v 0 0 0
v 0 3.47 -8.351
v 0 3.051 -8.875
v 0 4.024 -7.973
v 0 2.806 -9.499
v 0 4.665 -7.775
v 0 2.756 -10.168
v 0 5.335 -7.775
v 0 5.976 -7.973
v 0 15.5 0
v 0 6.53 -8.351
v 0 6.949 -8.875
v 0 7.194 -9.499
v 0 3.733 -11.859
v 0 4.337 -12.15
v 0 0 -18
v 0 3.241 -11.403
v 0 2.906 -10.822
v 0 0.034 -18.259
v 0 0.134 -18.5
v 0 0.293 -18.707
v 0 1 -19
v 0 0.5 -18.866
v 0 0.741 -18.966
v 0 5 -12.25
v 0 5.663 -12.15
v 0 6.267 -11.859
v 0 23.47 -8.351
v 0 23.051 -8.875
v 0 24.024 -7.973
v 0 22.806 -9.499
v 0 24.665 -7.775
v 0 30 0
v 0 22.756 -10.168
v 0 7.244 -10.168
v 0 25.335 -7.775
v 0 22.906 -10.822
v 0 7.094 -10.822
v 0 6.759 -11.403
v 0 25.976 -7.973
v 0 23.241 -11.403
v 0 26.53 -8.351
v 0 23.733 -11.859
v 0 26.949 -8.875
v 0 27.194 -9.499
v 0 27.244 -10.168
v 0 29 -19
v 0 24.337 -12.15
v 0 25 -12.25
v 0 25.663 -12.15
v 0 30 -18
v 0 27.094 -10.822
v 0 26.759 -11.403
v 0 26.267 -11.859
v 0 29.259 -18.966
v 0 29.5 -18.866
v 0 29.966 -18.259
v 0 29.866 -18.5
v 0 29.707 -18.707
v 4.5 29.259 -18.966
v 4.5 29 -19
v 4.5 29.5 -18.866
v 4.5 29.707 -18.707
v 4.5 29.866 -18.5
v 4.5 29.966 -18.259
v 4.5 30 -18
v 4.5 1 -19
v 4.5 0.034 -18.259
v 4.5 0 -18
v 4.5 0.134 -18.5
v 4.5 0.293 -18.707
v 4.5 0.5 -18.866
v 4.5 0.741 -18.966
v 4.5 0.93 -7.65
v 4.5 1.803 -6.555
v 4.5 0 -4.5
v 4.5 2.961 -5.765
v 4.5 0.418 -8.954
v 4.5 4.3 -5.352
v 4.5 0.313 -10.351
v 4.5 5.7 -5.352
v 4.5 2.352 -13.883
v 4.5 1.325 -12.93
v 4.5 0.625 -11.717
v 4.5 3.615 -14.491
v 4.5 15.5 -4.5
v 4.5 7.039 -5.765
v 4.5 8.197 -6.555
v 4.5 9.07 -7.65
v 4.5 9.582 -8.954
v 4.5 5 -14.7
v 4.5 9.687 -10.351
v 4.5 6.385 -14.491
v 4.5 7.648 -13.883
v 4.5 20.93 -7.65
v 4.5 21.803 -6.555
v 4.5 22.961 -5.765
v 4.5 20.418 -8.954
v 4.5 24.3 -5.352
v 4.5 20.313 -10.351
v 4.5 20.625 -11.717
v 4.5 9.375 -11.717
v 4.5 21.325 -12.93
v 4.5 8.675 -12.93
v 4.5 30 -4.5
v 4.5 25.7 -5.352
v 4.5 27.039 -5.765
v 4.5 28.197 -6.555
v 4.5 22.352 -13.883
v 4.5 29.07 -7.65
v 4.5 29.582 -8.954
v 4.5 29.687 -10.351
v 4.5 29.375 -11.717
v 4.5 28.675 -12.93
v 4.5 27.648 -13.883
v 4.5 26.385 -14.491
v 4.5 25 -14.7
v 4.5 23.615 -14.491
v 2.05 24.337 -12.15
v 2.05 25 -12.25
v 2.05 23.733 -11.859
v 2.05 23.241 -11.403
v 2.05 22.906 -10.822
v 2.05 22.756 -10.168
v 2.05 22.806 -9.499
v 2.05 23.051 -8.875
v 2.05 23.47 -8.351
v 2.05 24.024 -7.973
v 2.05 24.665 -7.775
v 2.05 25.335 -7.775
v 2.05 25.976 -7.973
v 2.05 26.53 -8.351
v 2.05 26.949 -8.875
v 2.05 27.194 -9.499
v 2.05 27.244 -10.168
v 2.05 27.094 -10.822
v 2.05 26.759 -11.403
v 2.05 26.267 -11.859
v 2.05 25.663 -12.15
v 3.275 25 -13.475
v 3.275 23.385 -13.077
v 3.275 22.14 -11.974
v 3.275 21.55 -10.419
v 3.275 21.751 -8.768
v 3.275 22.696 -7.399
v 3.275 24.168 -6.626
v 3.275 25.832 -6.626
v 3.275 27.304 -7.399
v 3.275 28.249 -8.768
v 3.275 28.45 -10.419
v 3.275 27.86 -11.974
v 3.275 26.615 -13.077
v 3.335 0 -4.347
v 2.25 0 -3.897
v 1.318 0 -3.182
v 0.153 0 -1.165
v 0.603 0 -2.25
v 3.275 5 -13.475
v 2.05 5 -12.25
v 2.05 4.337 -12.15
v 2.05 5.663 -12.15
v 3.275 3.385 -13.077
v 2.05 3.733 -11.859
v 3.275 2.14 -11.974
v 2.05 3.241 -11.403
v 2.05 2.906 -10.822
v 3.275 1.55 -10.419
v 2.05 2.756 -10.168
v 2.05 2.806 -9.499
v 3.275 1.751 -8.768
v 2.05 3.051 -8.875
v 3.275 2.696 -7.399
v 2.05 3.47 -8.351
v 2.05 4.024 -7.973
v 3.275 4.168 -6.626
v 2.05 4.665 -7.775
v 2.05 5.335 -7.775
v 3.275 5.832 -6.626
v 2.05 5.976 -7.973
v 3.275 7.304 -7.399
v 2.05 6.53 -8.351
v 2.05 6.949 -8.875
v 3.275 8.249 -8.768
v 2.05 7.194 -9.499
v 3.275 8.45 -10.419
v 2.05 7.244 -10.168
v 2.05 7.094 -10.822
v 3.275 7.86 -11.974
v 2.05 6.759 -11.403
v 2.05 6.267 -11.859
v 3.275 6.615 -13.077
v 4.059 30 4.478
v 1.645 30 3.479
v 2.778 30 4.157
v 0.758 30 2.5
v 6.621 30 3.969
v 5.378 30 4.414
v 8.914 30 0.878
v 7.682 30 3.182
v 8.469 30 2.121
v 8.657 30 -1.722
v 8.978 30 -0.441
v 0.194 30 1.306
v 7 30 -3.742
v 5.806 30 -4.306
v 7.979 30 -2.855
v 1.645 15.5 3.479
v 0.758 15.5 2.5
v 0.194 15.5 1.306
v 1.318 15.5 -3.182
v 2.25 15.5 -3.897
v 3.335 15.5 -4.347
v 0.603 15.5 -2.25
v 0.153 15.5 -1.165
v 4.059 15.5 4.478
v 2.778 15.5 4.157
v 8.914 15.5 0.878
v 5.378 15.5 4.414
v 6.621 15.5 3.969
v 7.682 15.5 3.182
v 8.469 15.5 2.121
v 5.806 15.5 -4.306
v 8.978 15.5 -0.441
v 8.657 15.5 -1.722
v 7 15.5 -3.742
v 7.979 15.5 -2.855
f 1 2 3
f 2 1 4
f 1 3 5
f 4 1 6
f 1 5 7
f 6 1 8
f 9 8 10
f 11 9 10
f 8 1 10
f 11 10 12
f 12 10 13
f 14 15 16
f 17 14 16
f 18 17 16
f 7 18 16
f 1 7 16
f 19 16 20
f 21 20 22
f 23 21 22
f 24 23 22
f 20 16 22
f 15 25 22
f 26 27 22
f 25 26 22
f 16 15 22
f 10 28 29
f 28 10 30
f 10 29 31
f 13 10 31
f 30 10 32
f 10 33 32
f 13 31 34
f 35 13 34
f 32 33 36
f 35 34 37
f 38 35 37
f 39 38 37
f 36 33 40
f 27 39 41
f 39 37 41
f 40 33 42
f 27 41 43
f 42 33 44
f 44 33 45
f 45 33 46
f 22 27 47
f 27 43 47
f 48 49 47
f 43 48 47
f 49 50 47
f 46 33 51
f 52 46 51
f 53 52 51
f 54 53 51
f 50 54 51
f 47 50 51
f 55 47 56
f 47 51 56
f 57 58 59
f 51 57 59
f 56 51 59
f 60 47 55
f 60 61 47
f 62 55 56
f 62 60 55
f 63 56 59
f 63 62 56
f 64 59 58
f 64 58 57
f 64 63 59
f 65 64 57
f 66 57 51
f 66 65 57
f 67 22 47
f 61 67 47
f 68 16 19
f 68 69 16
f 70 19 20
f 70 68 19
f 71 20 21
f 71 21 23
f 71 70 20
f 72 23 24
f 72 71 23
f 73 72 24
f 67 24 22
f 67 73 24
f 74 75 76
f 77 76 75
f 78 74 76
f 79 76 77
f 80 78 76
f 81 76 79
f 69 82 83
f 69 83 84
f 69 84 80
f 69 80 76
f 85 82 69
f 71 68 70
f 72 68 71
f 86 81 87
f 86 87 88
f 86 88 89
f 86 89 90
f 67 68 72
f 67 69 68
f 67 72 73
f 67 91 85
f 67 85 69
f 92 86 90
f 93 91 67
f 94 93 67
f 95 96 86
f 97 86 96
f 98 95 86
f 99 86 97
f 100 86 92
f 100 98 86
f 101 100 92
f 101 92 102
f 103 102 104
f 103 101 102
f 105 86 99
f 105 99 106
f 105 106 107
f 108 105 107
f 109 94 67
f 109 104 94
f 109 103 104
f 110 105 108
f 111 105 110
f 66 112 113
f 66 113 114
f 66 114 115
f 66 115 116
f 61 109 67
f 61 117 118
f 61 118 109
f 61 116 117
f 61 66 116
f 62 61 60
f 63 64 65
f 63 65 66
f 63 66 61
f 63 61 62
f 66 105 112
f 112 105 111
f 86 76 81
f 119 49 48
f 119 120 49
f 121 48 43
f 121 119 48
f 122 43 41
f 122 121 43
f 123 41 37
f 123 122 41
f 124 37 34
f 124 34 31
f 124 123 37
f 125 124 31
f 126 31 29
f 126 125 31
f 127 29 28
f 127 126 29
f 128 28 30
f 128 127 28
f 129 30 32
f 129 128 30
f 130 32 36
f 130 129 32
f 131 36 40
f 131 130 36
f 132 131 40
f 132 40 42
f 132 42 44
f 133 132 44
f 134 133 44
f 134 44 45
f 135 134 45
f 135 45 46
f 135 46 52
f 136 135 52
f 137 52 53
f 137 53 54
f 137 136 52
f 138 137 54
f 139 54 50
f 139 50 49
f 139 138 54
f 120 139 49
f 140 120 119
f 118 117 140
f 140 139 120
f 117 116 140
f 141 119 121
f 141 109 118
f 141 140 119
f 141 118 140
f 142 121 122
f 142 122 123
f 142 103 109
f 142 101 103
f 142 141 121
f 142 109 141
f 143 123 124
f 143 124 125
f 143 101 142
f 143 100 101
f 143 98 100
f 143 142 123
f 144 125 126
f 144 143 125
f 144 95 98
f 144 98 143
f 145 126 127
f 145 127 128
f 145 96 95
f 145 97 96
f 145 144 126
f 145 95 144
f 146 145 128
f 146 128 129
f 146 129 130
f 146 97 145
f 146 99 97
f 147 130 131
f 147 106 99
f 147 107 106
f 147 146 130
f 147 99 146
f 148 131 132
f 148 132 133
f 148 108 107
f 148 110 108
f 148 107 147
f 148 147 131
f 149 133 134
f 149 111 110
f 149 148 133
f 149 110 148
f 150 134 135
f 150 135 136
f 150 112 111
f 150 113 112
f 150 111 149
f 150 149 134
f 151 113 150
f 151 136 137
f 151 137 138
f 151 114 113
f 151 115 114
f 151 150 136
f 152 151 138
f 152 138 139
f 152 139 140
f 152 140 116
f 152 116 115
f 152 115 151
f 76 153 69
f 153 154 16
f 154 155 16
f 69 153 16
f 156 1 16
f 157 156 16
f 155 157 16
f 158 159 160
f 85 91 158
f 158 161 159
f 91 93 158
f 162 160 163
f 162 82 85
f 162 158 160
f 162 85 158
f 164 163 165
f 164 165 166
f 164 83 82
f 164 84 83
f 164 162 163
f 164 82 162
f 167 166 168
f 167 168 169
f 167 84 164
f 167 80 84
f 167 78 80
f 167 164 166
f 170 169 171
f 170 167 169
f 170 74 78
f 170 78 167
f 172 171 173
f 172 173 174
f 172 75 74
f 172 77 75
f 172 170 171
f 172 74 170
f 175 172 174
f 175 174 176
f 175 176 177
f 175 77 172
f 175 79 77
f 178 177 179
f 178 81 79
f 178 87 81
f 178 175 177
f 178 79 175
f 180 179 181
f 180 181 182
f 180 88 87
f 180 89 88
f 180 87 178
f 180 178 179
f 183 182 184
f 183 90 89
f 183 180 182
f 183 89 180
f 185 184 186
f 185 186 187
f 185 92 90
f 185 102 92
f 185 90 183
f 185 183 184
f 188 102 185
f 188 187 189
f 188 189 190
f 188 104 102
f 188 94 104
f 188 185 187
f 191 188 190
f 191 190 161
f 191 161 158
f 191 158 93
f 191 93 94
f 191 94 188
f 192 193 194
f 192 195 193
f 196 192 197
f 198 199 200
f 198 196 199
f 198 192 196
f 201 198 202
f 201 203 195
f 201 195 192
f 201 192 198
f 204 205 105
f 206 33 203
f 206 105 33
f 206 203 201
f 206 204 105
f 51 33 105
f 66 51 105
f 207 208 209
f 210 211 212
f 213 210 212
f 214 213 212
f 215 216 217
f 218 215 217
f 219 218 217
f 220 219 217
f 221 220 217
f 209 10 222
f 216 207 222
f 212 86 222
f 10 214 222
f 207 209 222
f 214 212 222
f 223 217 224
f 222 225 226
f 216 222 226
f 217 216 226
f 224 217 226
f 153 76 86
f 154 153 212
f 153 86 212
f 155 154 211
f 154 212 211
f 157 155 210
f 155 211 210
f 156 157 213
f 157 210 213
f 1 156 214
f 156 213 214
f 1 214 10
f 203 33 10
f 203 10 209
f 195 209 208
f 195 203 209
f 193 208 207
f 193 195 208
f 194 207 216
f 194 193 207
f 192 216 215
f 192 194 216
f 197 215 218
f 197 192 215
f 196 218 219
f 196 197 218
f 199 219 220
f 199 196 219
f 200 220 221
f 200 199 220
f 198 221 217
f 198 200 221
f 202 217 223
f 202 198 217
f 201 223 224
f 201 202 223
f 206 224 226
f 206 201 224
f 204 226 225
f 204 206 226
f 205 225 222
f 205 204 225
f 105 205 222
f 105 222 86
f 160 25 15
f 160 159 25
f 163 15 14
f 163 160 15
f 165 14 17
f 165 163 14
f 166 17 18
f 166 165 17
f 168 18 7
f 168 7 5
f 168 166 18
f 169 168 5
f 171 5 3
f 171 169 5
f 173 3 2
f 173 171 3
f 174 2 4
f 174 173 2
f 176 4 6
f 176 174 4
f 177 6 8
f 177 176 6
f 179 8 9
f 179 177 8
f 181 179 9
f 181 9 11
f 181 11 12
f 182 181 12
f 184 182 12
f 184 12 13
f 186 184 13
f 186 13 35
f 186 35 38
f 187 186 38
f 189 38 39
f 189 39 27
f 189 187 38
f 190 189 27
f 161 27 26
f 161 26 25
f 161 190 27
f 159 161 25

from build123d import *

# Parameters (mm, degrees)
SKETCH1_W                                    = 19
SKETCH1_H                                    = 30
PLATE_DEPTH                                  = 4.5
SKETCH2_R                                    = 4.5
CYLINDER_DEPTH                               = 14.5
CLEARANCE_START                              = -14.5
SKETCH2_2_R                                  = 4.5
CLEARANCE_DEPTH                              = 15.5
FILLET1_R                                    = 1
CSK_FOR_M4_COUNTERSUNK_FLAT_HEAD_SCR_2_COUNT = 2
CSK_FOR_M4_COUNTERSUNK_FLAT_HEAD_SCR_2_PITCH = 20


with BuildPart() as part:
    # Sketch1 → Plate (new body)
    with BuildSketch(Plane(origin=(0, 0, 0), x_dir=(0, 0, -1), z_dir=(1, 0, 0))):
        with Locations((9.5, 15)):
            Rectangle(SKETCH1_W, SKETCH1_H)
    extrude(amount=PLATE_DEPTH)

    # Sketch2 → Cylinder (add)
    with BuildSketch(Plane(origin=(0, 30, 0), x_dir=(1, 0, 0), z_dir=(0, 1, 0))):
        with Locations((4.5, 0)):
            Circle(SKETCH2_R)
    extrude(amount=-CYLINDER_DEPTH)

    # Sketch2<2> → Clearance (cut)
    with BuildSketch(Plane(origin=(0, 30, 0), x_dir=(1, 0, 0), z_dir=(0, 1, 0)).offset(CLEARANCE_START)):
        with Locations((4.5, 0)):
            Circle(SKETCH2_2_R)
    extrude(amount=-CLEARANCE_DEPTH, mode=Mode.SUBTRACT)

    # Fillet1
    fillet1_edges = [part.edges().sort_by_distance(p)[0] for p in [
        (2.25, 30, -19),
        (2.25, 0, -19),
    ]]
    fillet(fillet1_edges, radius=FILLET1_R)

    # Sketch4 → CSK for M4 Countersunk Flat Head Screw1 (revolve, cut)
    with BuildSketch(Plane(origin=(4.5, 25, -10), x_dir=(0, 0, -1), z_dir=(0, 1, 0))):
        Polygon((0, 0), (0, 4.5), (2.25, 4.5), (2.25, 2.45), (4.7, 0), align=None)
    csk_for_m4_countersunk_flat_head_screw1 = revolve(axis=Axis((10.85, 25, -10), (-1, 0, 0)), mode=Mode.SUBTRACT)

    # CSK for M4 Countersunk Flat Head Scr 2: CSK for M4 Countersunk Flat Head Screw1 ×2
    with Locations(*[(0, -i * CSK_FOR_M4_COUNTERSUNK_FLAT_HEAD_SCR_2_PITCH, 0) for i in range(1, CSK_FOR_M4_COUNTERSUNK_FLAT_HEAD_SCR_2_COUNT)]):
        add(csk_for_m4_countersunk_flat_head_screw1, mode=Mode.SUBTRACT)


solid = part.part
